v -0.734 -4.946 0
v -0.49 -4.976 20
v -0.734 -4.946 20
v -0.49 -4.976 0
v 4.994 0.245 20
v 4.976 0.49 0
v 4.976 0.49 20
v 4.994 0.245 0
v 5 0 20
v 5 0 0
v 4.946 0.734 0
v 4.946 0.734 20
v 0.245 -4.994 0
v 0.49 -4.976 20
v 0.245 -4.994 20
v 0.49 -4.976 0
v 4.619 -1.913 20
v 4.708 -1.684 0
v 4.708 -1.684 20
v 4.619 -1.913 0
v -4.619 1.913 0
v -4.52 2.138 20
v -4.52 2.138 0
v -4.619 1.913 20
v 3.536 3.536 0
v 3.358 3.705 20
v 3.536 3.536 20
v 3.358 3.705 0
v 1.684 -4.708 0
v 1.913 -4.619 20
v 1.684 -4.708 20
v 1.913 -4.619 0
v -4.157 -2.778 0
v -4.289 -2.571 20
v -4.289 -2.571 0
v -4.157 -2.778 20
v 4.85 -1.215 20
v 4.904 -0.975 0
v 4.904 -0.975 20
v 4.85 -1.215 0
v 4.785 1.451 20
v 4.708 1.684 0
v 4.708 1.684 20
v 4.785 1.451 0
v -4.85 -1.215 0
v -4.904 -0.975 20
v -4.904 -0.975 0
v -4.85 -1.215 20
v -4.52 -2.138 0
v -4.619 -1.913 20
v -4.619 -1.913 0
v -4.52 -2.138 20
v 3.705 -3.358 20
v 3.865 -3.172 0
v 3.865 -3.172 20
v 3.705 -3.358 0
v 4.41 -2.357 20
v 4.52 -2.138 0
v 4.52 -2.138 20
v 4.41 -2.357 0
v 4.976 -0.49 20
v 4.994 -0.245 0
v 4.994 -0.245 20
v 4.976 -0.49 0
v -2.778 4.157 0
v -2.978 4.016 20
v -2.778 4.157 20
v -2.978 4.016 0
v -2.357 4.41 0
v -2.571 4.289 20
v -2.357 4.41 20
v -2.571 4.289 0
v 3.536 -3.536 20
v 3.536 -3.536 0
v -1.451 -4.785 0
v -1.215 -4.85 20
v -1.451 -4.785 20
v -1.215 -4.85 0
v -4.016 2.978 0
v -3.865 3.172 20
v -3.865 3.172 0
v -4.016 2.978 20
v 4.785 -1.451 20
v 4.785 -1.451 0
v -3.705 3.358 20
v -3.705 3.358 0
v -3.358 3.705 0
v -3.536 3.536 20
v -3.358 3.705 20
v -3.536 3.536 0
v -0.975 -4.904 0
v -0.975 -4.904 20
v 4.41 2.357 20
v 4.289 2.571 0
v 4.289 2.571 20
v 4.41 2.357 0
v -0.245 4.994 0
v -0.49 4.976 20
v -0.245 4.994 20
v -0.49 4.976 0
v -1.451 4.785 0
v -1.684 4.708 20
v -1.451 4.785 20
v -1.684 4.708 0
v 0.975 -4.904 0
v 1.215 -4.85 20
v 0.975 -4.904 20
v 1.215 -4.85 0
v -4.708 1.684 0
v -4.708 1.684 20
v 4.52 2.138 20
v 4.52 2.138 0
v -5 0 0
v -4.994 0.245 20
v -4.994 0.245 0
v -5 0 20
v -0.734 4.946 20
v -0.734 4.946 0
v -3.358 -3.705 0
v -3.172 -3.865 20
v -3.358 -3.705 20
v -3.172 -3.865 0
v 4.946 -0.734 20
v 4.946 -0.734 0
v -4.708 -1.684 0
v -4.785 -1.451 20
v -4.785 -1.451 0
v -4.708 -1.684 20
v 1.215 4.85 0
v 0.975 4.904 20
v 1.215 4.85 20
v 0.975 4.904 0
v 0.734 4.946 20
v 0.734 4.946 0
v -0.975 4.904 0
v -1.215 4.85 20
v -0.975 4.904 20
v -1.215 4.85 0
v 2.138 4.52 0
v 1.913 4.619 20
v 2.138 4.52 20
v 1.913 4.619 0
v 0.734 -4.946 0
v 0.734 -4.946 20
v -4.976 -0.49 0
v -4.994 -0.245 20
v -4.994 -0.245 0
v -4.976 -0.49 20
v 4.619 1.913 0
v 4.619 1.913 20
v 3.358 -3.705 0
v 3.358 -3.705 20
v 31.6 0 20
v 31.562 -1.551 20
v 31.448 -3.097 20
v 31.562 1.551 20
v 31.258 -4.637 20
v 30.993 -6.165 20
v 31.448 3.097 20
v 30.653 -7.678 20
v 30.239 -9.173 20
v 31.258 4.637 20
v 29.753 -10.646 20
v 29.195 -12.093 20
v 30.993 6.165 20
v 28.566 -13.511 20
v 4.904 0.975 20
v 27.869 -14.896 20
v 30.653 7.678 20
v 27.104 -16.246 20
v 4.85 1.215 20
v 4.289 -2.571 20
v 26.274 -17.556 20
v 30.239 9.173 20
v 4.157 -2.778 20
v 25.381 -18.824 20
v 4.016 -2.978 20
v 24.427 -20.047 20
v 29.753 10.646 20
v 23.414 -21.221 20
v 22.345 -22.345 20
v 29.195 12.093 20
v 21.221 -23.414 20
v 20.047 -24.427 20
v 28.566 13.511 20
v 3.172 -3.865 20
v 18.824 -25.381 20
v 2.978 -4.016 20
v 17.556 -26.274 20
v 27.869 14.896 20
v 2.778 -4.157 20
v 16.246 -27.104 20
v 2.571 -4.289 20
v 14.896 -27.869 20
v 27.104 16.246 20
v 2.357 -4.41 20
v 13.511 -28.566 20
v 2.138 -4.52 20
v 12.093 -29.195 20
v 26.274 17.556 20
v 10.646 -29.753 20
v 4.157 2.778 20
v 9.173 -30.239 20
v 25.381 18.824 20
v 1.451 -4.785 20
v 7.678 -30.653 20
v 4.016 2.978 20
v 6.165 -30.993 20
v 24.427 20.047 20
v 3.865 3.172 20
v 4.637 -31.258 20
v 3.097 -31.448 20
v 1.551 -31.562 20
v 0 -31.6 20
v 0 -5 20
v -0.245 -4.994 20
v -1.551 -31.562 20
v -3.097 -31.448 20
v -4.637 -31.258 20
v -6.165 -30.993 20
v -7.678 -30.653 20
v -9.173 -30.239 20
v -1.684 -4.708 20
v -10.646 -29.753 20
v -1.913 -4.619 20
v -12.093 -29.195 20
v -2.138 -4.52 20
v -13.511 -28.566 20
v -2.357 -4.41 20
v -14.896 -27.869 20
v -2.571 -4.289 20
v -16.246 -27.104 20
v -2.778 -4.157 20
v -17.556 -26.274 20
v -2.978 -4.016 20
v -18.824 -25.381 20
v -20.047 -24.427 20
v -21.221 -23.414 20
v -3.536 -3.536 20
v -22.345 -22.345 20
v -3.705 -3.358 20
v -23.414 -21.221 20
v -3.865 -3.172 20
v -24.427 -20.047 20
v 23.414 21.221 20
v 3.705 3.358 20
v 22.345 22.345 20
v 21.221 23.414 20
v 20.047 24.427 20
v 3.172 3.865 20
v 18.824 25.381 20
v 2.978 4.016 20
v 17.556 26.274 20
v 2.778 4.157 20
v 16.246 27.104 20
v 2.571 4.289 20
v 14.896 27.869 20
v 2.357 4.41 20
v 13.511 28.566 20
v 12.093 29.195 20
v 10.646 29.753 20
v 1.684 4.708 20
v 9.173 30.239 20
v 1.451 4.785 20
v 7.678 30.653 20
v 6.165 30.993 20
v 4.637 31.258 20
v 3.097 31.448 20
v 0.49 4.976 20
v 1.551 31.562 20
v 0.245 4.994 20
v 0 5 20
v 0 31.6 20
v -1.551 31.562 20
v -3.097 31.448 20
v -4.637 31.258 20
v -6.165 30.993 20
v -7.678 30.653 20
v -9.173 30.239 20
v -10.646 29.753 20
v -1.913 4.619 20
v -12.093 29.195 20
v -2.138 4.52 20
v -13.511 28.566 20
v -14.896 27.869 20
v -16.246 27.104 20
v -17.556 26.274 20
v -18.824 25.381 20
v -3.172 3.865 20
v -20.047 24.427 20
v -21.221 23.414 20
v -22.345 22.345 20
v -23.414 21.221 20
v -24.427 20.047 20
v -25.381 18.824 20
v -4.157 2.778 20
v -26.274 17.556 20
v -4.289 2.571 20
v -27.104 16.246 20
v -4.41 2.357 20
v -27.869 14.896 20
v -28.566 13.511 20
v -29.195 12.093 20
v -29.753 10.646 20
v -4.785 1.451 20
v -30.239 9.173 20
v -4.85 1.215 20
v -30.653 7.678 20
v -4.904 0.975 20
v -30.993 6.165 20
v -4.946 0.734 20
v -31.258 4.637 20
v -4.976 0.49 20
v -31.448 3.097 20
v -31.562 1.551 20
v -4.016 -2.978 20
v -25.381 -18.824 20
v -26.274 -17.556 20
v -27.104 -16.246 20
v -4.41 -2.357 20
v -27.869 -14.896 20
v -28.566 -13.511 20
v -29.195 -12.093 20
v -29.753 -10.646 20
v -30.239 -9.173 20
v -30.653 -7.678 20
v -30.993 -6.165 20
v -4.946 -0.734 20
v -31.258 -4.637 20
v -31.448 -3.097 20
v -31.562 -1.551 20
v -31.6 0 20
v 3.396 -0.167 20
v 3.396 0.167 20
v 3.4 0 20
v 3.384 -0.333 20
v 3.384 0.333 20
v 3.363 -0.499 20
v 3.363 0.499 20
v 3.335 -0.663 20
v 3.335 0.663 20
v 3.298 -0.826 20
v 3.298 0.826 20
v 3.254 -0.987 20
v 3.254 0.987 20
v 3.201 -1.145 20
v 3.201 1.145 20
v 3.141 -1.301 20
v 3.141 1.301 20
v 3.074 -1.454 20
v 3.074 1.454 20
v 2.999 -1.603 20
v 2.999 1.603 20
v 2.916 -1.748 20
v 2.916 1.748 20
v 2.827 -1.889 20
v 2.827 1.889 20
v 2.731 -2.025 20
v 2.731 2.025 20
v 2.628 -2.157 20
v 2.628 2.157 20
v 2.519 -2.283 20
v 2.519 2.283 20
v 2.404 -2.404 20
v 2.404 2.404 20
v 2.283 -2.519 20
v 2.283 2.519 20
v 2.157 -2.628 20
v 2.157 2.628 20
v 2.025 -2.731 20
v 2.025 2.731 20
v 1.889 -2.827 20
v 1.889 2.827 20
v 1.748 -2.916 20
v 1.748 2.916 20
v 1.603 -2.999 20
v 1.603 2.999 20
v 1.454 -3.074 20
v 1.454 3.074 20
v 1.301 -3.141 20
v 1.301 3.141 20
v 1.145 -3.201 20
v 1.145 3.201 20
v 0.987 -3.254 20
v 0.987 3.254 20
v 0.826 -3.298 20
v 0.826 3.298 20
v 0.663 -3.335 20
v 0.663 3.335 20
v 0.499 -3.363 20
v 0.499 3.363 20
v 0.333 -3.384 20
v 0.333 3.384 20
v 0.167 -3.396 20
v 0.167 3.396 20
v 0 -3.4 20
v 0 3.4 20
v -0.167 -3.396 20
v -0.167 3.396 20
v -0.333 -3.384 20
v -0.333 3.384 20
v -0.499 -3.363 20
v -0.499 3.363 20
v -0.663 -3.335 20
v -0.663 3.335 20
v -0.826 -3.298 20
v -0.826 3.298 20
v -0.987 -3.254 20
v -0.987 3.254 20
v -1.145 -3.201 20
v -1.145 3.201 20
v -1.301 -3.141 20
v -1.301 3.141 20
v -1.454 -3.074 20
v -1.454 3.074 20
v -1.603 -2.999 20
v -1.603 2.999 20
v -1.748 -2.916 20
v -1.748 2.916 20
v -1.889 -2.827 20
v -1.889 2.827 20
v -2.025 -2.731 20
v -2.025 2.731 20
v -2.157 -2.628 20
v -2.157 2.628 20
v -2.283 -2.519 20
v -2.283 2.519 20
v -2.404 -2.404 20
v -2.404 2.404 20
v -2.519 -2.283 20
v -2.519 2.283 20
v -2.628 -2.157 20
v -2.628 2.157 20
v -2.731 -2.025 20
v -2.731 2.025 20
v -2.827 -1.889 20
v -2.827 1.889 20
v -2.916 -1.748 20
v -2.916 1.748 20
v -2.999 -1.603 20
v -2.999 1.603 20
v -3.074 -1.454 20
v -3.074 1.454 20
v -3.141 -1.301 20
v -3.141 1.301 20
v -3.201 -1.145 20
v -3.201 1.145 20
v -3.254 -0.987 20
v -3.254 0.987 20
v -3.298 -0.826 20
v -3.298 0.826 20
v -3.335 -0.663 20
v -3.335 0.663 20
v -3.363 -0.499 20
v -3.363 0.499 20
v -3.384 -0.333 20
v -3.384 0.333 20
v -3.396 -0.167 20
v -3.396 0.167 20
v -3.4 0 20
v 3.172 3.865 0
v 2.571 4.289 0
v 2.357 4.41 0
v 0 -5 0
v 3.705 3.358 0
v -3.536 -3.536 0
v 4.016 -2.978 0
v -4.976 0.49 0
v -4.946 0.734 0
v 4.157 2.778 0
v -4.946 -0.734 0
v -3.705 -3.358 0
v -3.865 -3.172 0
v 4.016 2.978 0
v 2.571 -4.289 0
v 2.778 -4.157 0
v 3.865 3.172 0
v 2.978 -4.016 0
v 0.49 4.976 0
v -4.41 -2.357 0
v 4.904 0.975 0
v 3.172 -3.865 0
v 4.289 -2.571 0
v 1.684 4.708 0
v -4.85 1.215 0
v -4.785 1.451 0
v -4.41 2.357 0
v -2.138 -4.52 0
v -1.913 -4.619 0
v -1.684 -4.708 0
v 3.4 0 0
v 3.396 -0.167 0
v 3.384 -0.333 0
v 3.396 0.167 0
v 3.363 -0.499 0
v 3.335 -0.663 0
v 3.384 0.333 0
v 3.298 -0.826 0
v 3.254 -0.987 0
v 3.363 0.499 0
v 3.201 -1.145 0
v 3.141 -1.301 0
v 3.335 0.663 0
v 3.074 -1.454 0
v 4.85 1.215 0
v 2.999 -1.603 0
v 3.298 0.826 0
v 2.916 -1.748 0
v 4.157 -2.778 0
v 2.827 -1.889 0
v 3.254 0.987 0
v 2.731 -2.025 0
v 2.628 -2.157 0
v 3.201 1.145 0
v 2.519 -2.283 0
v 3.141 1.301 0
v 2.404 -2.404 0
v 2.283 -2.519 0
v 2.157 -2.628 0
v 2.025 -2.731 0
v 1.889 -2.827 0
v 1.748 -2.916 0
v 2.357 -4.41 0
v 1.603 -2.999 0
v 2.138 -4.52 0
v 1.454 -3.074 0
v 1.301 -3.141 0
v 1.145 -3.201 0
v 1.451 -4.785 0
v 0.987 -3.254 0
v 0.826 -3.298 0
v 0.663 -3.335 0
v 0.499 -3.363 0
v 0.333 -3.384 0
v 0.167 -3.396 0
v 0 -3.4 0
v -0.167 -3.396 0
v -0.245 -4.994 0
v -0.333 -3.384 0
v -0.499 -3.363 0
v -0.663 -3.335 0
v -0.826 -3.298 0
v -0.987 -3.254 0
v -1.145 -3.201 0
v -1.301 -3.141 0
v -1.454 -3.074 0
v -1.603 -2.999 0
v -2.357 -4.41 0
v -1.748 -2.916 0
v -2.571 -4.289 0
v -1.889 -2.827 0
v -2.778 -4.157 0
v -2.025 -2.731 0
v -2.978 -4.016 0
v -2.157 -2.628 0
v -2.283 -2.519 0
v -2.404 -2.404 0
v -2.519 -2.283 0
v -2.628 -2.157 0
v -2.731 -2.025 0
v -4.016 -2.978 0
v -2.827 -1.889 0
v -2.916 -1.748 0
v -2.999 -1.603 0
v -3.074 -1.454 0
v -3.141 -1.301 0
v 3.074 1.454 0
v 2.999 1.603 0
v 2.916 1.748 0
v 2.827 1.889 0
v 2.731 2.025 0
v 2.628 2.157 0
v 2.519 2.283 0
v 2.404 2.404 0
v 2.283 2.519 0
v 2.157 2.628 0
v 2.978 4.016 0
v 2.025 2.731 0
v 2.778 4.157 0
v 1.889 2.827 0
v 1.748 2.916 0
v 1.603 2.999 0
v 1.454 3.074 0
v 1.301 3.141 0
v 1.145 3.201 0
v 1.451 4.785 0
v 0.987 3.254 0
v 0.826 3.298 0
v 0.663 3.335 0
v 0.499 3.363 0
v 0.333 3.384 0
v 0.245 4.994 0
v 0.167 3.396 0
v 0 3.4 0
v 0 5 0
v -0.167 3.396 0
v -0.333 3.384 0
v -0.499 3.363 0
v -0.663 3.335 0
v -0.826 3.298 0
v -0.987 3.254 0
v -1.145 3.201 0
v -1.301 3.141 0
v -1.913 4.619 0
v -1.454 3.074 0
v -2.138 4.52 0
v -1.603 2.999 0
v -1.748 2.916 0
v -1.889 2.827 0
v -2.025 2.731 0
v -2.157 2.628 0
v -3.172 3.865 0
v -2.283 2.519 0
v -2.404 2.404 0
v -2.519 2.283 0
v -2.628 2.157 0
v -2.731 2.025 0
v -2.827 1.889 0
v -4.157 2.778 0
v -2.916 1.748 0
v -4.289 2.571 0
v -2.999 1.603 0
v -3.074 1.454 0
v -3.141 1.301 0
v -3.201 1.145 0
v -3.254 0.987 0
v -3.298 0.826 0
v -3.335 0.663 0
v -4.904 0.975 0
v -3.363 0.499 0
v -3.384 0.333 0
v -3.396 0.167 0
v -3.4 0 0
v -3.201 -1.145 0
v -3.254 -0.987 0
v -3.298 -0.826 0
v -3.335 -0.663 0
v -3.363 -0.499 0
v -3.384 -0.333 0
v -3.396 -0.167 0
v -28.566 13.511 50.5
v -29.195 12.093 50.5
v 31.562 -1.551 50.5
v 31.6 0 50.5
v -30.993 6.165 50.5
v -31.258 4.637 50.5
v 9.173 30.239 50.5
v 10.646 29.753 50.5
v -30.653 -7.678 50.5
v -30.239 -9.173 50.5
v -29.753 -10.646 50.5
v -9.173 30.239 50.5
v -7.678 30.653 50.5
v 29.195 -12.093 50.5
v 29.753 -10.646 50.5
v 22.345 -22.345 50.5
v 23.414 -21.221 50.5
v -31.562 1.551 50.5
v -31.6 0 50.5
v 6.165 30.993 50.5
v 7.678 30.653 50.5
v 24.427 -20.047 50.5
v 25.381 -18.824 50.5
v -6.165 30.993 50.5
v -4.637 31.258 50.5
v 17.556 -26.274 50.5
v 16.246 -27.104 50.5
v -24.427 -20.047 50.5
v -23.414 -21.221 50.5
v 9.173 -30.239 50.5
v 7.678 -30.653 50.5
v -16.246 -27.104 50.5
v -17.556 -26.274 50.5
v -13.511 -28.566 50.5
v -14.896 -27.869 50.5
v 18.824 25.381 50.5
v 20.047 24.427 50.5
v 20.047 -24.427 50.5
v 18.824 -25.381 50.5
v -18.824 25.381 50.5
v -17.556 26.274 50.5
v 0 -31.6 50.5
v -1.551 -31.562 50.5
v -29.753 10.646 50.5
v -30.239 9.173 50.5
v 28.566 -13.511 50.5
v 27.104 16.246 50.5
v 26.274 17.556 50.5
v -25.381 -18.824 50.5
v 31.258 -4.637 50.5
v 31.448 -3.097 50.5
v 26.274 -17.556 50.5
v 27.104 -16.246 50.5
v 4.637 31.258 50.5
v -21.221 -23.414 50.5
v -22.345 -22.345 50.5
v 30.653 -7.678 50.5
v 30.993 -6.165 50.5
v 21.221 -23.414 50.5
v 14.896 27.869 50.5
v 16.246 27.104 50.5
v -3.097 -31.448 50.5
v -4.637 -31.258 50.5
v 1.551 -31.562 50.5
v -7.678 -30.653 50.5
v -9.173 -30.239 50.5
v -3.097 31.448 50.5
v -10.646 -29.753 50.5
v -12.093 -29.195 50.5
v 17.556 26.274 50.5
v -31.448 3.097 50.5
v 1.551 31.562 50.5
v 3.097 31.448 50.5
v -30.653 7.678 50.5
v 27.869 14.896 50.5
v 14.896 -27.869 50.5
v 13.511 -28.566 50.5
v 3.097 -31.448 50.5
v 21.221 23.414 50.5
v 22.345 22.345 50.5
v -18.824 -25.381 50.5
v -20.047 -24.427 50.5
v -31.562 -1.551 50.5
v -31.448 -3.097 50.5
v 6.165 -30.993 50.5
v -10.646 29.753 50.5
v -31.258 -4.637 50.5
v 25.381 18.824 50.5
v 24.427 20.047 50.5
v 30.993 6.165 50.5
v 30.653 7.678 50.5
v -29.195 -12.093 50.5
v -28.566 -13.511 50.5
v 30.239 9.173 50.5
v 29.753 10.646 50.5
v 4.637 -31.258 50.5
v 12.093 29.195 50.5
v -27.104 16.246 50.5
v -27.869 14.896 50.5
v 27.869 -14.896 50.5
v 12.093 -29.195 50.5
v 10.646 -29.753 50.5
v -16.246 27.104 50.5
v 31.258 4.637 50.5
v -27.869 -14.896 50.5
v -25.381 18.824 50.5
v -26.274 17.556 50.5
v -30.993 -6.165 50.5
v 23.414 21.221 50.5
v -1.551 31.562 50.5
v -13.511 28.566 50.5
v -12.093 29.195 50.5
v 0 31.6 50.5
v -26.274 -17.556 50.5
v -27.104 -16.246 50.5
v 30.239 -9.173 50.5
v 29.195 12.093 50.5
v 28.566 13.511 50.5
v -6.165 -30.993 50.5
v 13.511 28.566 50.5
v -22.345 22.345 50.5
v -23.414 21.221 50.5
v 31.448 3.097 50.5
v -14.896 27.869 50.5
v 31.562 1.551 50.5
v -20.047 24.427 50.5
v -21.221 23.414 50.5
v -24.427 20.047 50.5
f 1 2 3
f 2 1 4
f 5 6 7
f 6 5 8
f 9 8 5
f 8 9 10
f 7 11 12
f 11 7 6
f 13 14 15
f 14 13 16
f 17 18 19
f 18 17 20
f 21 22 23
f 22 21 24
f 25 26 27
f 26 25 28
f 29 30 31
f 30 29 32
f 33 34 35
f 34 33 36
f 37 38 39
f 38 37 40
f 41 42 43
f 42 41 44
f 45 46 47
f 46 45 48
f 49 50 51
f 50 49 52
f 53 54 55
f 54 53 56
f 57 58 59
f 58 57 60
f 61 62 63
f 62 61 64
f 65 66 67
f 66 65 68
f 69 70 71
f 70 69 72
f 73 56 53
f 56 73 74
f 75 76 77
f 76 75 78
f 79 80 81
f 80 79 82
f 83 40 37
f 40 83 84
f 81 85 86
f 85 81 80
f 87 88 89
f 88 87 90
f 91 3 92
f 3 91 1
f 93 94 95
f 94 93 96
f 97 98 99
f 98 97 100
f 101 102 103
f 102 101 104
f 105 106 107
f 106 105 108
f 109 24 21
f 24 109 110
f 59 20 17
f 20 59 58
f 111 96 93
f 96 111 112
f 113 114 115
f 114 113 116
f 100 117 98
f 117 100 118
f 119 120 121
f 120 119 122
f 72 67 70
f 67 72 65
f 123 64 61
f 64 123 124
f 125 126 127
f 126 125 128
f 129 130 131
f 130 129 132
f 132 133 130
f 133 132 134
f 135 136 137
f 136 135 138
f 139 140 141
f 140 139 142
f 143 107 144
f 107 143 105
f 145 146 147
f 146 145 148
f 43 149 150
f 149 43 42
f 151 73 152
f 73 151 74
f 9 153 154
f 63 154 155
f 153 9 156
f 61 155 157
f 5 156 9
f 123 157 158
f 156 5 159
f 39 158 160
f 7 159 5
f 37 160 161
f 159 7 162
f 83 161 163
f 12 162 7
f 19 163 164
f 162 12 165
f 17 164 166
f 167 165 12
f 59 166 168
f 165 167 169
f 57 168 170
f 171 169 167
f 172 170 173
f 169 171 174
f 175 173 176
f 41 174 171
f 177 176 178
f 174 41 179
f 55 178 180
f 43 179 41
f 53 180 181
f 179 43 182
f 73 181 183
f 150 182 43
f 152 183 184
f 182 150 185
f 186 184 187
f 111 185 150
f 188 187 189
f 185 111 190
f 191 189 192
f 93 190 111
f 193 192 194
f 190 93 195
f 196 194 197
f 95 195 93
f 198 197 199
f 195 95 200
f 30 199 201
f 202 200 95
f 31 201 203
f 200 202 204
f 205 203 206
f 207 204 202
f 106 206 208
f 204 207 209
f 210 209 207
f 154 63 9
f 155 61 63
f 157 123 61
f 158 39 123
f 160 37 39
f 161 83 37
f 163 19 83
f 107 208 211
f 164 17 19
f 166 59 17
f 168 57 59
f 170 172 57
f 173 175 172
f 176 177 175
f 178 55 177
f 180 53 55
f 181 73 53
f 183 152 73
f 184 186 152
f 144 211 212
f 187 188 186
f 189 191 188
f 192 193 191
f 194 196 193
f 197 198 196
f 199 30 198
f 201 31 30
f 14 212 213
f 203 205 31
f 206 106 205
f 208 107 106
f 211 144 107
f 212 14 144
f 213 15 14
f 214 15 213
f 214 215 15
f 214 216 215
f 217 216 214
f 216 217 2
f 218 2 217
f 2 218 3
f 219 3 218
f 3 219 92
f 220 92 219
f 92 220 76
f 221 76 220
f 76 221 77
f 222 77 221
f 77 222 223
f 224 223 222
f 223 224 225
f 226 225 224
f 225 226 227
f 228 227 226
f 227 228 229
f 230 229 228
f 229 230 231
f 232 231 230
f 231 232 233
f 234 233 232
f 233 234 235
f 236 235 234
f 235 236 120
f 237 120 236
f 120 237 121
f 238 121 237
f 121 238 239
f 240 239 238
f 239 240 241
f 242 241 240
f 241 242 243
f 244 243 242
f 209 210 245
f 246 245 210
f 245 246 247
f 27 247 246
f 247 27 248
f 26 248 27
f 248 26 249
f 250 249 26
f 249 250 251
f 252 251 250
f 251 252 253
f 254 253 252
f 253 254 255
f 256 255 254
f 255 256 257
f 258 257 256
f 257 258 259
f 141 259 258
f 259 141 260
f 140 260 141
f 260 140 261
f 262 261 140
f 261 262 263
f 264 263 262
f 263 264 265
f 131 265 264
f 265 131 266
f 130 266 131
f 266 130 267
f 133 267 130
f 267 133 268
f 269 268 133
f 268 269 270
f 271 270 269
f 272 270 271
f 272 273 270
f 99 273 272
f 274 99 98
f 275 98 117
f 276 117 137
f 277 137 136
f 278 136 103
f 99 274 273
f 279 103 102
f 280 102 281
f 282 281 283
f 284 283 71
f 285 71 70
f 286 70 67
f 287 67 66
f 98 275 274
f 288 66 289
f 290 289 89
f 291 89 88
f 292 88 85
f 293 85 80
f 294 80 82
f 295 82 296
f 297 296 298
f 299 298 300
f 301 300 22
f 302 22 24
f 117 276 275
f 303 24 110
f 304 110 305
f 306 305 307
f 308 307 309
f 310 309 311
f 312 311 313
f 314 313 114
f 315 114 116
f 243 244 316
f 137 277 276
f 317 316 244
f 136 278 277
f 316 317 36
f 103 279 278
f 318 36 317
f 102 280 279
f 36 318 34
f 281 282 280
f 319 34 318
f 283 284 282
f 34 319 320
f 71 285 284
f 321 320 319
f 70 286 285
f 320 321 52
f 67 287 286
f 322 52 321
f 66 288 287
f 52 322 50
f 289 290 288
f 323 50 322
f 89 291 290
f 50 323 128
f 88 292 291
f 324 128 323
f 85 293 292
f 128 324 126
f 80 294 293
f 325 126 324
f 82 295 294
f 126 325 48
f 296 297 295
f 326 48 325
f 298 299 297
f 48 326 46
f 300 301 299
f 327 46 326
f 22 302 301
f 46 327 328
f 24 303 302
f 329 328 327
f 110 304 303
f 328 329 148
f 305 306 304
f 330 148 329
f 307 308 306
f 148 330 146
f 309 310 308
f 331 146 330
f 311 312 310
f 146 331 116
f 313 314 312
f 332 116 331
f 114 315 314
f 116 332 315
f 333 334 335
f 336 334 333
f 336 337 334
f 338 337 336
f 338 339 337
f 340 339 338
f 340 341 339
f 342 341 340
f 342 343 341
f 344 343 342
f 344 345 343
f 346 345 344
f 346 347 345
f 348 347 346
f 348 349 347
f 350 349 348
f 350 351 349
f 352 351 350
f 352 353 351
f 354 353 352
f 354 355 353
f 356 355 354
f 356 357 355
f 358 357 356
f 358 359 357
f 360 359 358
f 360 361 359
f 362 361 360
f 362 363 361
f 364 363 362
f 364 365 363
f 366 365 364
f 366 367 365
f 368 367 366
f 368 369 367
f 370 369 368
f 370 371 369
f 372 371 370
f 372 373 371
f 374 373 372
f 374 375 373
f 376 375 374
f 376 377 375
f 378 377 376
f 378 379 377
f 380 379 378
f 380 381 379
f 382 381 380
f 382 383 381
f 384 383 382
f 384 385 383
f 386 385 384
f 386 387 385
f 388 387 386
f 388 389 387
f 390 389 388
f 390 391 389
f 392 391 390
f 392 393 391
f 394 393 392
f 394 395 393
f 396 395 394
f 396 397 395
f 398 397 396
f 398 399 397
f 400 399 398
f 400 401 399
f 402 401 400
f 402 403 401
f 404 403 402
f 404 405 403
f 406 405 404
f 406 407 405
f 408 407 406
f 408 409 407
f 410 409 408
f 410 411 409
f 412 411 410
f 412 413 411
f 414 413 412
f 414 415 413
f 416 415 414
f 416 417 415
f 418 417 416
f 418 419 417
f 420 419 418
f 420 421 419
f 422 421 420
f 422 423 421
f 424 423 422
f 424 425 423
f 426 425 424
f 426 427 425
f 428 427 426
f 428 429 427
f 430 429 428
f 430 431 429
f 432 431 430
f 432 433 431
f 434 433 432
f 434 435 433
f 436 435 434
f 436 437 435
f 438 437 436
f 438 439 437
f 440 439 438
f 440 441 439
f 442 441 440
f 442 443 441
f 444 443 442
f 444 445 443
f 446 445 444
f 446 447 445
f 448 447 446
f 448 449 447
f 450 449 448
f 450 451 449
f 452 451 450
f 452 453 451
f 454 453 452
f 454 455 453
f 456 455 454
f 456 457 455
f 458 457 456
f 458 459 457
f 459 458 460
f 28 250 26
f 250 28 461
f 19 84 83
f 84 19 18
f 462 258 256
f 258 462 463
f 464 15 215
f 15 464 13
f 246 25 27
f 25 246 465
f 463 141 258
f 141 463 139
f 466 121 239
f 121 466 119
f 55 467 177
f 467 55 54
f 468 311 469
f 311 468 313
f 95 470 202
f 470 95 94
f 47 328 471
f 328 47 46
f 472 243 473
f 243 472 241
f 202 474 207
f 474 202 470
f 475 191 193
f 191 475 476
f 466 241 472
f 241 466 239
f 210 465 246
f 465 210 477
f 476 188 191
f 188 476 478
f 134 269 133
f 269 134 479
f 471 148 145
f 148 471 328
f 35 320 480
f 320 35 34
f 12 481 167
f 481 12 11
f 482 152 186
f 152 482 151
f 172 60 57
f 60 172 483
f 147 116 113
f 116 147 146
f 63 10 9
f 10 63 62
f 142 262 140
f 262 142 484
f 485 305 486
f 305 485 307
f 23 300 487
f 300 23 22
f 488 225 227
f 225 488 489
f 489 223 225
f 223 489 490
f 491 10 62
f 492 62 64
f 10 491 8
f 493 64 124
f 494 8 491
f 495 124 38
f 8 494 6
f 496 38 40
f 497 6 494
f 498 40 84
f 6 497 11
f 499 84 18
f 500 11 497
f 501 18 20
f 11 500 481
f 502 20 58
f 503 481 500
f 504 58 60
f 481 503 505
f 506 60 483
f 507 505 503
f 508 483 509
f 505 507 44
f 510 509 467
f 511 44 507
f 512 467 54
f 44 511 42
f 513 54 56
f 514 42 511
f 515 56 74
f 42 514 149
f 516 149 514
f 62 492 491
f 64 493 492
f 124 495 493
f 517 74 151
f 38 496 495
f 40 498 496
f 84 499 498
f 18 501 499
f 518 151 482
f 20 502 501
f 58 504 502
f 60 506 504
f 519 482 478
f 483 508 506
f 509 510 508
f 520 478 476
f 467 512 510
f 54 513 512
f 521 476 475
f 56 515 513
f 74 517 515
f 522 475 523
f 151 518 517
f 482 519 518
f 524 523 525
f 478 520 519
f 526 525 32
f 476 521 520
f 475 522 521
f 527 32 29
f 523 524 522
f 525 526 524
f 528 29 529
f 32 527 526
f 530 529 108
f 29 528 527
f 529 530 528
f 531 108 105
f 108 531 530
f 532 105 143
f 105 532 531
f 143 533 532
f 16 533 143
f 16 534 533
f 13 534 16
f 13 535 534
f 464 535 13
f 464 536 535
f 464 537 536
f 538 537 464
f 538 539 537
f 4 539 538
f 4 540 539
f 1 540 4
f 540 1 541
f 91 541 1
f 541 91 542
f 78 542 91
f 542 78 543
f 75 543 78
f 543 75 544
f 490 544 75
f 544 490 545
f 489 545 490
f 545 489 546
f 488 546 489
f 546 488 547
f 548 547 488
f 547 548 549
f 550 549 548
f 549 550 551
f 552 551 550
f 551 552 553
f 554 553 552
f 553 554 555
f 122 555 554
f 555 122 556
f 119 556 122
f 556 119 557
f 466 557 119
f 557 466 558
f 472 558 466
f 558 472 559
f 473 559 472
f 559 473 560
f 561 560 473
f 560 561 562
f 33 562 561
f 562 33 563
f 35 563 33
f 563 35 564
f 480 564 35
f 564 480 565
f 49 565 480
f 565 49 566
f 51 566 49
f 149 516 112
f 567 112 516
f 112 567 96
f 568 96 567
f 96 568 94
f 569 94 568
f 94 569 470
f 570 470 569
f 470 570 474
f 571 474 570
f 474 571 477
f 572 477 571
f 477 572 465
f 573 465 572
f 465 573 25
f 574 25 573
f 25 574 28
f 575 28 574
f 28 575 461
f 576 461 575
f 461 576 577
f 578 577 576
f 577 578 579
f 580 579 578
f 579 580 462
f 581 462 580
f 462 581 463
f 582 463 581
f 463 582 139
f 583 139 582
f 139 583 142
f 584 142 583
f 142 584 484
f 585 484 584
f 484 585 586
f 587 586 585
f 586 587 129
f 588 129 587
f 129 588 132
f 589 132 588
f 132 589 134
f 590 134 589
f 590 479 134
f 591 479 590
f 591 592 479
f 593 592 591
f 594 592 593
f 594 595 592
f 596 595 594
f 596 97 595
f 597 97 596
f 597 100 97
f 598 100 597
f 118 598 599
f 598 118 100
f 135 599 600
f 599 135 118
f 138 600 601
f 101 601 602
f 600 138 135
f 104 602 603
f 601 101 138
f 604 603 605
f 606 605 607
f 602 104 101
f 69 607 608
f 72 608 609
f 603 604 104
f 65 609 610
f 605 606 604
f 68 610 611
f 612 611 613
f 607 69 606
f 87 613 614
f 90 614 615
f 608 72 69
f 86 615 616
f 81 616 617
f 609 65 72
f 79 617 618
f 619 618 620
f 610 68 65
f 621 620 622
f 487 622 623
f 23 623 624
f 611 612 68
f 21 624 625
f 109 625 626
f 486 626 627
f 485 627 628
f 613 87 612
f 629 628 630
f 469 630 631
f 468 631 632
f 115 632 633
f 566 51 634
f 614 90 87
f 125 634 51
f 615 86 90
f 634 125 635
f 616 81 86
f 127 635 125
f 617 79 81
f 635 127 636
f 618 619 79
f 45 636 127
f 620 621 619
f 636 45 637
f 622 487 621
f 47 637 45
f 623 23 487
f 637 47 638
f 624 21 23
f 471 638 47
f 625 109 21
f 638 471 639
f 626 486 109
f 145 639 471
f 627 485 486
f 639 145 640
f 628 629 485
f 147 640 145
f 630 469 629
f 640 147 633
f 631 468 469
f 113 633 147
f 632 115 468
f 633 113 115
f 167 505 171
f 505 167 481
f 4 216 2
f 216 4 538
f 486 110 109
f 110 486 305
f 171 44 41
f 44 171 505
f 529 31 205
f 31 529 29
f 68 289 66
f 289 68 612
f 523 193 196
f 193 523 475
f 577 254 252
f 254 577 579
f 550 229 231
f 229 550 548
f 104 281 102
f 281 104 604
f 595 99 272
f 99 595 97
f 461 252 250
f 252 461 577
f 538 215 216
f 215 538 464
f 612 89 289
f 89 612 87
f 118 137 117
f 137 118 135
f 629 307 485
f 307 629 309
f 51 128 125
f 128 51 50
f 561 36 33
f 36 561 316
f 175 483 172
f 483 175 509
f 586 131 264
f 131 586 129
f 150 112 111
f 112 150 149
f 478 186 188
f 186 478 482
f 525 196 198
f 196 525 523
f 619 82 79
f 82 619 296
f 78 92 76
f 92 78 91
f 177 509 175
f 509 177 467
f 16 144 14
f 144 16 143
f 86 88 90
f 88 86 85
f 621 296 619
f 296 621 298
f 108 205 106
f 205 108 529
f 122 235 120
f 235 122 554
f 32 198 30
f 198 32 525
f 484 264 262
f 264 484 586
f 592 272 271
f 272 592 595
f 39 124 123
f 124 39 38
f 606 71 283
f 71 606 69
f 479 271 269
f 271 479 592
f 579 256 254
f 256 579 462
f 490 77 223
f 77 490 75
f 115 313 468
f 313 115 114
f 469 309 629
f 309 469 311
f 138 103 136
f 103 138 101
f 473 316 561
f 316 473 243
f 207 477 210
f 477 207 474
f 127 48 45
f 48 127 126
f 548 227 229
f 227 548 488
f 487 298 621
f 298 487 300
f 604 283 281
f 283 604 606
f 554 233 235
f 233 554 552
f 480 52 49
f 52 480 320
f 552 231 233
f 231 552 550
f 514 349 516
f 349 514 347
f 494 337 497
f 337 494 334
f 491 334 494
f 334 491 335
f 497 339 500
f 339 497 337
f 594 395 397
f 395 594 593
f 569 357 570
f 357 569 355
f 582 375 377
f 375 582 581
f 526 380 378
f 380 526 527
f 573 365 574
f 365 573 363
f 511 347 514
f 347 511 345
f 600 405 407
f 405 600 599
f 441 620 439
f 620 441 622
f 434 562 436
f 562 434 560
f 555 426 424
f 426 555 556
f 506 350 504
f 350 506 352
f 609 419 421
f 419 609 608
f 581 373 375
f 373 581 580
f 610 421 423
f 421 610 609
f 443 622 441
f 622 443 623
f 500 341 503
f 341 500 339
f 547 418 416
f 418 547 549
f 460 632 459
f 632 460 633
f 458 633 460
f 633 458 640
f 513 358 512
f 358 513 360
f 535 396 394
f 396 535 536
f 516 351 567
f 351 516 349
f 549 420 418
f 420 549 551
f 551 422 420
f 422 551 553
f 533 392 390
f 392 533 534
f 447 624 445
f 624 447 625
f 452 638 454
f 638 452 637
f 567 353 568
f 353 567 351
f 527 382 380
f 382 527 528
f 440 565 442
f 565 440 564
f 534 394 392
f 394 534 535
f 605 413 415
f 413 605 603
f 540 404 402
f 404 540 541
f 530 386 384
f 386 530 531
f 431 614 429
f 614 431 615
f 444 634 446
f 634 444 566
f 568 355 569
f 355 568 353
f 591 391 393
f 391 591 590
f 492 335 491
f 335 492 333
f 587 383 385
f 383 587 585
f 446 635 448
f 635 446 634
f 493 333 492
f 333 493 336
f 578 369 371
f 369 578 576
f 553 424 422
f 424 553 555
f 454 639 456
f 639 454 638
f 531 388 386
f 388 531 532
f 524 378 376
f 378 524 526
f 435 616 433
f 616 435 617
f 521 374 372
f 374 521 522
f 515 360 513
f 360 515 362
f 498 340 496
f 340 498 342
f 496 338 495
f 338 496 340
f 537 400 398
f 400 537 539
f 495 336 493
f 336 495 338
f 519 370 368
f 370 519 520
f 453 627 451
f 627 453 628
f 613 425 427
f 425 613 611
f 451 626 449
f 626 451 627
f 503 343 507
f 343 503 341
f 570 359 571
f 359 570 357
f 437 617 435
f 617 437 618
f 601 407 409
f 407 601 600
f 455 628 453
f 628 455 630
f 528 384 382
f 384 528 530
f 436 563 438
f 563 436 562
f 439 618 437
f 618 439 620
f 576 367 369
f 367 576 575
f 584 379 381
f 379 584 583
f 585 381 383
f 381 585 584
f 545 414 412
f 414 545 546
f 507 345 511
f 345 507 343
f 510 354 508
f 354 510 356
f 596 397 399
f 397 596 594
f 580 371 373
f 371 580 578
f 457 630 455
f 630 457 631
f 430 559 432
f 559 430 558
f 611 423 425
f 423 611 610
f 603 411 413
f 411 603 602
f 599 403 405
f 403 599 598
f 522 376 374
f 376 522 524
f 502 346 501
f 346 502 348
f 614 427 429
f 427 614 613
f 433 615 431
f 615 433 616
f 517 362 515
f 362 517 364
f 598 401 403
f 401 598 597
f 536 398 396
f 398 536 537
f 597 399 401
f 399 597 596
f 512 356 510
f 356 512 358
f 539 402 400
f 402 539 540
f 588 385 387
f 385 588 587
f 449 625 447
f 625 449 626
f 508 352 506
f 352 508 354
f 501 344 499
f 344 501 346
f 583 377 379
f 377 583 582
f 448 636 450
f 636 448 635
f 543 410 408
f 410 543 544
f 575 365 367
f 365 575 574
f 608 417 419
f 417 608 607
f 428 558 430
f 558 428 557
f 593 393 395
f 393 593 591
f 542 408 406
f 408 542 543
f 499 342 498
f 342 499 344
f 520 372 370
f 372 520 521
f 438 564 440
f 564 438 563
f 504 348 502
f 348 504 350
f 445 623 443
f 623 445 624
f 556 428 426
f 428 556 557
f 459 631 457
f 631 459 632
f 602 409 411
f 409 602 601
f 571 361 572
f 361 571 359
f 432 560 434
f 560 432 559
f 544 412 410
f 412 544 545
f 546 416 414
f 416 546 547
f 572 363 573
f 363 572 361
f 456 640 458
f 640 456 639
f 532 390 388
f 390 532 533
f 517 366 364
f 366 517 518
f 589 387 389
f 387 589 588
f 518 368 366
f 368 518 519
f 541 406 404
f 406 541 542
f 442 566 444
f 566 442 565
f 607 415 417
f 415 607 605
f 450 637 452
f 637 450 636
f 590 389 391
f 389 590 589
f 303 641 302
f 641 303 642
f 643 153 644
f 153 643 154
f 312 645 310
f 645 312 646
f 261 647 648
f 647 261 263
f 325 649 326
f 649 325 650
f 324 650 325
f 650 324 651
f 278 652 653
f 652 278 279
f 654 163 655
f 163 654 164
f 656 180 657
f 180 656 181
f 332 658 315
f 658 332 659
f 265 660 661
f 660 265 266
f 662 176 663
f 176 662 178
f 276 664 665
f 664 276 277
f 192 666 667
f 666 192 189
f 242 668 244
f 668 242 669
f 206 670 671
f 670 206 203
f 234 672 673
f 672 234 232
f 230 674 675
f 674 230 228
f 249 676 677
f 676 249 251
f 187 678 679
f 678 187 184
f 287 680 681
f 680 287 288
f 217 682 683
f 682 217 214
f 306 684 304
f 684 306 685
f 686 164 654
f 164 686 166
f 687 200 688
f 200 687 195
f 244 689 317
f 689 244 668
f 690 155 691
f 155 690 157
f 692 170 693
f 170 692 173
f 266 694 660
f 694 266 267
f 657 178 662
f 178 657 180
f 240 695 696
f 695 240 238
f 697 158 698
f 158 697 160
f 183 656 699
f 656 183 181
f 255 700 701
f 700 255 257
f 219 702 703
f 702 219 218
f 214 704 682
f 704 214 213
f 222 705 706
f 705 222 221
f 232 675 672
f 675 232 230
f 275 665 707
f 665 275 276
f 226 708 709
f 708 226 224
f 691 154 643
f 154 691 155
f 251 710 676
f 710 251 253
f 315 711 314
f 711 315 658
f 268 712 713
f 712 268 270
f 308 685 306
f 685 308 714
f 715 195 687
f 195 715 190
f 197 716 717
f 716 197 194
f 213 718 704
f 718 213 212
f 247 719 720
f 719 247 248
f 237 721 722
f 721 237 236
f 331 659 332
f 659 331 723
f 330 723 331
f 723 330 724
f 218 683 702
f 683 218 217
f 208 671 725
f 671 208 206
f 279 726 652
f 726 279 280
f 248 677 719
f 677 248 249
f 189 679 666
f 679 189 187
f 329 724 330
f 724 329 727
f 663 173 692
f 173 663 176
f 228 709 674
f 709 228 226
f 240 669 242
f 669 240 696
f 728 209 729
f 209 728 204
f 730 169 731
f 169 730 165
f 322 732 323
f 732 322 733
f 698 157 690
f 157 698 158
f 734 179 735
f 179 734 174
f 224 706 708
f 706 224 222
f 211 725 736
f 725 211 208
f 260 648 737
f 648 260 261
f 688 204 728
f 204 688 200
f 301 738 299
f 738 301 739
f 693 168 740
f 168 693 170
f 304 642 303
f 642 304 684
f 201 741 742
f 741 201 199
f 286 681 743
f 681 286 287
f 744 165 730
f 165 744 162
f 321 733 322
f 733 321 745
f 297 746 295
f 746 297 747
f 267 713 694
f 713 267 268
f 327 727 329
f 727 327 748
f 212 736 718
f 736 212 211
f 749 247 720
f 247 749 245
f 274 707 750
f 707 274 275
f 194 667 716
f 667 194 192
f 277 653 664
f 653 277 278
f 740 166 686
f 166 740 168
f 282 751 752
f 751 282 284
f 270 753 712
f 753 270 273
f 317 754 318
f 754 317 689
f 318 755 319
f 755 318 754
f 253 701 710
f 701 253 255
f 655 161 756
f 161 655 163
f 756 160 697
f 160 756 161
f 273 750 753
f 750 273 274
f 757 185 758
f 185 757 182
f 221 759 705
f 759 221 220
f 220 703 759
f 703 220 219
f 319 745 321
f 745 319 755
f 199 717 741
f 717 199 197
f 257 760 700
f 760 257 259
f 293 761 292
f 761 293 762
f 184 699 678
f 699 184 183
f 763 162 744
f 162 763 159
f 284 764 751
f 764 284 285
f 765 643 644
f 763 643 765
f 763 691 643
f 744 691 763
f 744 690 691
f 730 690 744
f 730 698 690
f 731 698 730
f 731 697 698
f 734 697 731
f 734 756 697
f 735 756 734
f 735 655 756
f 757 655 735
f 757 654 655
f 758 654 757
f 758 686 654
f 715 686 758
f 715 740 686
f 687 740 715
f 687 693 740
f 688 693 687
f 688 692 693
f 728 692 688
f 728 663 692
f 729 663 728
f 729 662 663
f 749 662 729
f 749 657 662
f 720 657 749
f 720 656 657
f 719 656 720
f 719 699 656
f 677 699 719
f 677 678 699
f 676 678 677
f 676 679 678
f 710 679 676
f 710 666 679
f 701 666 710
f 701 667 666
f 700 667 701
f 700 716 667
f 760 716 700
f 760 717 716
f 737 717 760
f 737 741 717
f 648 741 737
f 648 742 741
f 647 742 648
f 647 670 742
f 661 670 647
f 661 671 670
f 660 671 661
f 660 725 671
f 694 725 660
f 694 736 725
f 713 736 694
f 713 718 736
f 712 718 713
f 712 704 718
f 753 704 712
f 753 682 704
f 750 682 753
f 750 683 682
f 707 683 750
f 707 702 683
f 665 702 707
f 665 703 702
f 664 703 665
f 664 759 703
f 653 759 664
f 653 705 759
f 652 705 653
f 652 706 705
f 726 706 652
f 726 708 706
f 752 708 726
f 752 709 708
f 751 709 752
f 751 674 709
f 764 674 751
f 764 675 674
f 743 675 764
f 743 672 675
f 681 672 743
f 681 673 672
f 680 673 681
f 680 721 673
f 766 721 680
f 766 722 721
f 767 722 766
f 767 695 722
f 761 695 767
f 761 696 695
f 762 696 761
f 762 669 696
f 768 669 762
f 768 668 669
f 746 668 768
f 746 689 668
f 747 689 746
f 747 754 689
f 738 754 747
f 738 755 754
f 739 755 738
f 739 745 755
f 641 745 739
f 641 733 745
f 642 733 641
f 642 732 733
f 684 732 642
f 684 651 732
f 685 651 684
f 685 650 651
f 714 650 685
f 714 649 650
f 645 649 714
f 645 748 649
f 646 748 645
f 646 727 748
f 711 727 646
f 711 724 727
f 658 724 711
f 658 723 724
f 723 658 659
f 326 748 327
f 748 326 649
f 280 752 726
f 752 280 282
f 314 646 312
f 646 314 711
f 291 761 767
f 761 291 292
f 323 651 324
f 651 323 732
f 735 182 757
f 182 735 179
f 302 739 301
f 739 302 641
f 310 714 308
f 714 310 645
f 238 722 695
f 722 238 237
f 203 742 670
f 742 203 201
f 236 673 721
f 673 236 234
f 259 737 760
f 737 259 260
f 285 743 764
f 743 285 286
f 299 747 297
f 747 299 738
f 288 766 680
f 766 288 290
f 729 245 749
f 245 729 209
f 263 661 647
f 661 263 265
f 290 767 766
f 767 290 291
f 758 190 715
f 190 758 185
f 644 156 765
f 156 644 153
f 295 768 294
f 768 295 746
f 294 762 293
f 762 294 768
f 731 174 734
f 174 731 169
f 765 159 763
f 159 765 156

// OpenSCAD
// Small lab funnel - printed upright, open top and bottom
// Units: mm. One complete part, no external libraries.

// ---- Parameters ----
spout_od      = 10;    // spout outer diameter
spout_length  = 20;    // spout runs from z = 0 to z = 20
cone_bottom_d = 10;    // cone outer diameter at z = 20 (spout top)
cone_top_d    = 60;    // cone outer diameter at rim, z = 50
wall          = 1.6;   // uniform wall thickness
eps           = 0.5;   // cutter overshoot past faces

$fn = 128;             // smoothness of curved shapes

// ---- Derived ----
spout_id = spout_od - 2 * wall;   // bore diameter of spout (6.8 mm)
cone_h   = 50 - 20;               // cone height (30 mm)

// ---- Model ----
union() {
    // Spout: straight tube from z = 0 to z = 20
    difference() {
        cylinder(d = spout_od, h = spout_length);
        translate([0, 0, -eps])
            cylinder(d = spout_id, h = spout_length + 2 * eps);
    }

    // Cone: widens from 10 mm at z = 20 to 60 mm at z = 50
    translate([0, 0, 20])
        linear_extrude(height = cone_h)
            circle(d = cone_bottom_d + 2 * wall);   // inner curve of cone
    translate([0, 0, 20])
        linear_extrude(height = cone_h + eps)
            circle(d = cone_top_d + 2 * wall);      // outer curve of cone
}
